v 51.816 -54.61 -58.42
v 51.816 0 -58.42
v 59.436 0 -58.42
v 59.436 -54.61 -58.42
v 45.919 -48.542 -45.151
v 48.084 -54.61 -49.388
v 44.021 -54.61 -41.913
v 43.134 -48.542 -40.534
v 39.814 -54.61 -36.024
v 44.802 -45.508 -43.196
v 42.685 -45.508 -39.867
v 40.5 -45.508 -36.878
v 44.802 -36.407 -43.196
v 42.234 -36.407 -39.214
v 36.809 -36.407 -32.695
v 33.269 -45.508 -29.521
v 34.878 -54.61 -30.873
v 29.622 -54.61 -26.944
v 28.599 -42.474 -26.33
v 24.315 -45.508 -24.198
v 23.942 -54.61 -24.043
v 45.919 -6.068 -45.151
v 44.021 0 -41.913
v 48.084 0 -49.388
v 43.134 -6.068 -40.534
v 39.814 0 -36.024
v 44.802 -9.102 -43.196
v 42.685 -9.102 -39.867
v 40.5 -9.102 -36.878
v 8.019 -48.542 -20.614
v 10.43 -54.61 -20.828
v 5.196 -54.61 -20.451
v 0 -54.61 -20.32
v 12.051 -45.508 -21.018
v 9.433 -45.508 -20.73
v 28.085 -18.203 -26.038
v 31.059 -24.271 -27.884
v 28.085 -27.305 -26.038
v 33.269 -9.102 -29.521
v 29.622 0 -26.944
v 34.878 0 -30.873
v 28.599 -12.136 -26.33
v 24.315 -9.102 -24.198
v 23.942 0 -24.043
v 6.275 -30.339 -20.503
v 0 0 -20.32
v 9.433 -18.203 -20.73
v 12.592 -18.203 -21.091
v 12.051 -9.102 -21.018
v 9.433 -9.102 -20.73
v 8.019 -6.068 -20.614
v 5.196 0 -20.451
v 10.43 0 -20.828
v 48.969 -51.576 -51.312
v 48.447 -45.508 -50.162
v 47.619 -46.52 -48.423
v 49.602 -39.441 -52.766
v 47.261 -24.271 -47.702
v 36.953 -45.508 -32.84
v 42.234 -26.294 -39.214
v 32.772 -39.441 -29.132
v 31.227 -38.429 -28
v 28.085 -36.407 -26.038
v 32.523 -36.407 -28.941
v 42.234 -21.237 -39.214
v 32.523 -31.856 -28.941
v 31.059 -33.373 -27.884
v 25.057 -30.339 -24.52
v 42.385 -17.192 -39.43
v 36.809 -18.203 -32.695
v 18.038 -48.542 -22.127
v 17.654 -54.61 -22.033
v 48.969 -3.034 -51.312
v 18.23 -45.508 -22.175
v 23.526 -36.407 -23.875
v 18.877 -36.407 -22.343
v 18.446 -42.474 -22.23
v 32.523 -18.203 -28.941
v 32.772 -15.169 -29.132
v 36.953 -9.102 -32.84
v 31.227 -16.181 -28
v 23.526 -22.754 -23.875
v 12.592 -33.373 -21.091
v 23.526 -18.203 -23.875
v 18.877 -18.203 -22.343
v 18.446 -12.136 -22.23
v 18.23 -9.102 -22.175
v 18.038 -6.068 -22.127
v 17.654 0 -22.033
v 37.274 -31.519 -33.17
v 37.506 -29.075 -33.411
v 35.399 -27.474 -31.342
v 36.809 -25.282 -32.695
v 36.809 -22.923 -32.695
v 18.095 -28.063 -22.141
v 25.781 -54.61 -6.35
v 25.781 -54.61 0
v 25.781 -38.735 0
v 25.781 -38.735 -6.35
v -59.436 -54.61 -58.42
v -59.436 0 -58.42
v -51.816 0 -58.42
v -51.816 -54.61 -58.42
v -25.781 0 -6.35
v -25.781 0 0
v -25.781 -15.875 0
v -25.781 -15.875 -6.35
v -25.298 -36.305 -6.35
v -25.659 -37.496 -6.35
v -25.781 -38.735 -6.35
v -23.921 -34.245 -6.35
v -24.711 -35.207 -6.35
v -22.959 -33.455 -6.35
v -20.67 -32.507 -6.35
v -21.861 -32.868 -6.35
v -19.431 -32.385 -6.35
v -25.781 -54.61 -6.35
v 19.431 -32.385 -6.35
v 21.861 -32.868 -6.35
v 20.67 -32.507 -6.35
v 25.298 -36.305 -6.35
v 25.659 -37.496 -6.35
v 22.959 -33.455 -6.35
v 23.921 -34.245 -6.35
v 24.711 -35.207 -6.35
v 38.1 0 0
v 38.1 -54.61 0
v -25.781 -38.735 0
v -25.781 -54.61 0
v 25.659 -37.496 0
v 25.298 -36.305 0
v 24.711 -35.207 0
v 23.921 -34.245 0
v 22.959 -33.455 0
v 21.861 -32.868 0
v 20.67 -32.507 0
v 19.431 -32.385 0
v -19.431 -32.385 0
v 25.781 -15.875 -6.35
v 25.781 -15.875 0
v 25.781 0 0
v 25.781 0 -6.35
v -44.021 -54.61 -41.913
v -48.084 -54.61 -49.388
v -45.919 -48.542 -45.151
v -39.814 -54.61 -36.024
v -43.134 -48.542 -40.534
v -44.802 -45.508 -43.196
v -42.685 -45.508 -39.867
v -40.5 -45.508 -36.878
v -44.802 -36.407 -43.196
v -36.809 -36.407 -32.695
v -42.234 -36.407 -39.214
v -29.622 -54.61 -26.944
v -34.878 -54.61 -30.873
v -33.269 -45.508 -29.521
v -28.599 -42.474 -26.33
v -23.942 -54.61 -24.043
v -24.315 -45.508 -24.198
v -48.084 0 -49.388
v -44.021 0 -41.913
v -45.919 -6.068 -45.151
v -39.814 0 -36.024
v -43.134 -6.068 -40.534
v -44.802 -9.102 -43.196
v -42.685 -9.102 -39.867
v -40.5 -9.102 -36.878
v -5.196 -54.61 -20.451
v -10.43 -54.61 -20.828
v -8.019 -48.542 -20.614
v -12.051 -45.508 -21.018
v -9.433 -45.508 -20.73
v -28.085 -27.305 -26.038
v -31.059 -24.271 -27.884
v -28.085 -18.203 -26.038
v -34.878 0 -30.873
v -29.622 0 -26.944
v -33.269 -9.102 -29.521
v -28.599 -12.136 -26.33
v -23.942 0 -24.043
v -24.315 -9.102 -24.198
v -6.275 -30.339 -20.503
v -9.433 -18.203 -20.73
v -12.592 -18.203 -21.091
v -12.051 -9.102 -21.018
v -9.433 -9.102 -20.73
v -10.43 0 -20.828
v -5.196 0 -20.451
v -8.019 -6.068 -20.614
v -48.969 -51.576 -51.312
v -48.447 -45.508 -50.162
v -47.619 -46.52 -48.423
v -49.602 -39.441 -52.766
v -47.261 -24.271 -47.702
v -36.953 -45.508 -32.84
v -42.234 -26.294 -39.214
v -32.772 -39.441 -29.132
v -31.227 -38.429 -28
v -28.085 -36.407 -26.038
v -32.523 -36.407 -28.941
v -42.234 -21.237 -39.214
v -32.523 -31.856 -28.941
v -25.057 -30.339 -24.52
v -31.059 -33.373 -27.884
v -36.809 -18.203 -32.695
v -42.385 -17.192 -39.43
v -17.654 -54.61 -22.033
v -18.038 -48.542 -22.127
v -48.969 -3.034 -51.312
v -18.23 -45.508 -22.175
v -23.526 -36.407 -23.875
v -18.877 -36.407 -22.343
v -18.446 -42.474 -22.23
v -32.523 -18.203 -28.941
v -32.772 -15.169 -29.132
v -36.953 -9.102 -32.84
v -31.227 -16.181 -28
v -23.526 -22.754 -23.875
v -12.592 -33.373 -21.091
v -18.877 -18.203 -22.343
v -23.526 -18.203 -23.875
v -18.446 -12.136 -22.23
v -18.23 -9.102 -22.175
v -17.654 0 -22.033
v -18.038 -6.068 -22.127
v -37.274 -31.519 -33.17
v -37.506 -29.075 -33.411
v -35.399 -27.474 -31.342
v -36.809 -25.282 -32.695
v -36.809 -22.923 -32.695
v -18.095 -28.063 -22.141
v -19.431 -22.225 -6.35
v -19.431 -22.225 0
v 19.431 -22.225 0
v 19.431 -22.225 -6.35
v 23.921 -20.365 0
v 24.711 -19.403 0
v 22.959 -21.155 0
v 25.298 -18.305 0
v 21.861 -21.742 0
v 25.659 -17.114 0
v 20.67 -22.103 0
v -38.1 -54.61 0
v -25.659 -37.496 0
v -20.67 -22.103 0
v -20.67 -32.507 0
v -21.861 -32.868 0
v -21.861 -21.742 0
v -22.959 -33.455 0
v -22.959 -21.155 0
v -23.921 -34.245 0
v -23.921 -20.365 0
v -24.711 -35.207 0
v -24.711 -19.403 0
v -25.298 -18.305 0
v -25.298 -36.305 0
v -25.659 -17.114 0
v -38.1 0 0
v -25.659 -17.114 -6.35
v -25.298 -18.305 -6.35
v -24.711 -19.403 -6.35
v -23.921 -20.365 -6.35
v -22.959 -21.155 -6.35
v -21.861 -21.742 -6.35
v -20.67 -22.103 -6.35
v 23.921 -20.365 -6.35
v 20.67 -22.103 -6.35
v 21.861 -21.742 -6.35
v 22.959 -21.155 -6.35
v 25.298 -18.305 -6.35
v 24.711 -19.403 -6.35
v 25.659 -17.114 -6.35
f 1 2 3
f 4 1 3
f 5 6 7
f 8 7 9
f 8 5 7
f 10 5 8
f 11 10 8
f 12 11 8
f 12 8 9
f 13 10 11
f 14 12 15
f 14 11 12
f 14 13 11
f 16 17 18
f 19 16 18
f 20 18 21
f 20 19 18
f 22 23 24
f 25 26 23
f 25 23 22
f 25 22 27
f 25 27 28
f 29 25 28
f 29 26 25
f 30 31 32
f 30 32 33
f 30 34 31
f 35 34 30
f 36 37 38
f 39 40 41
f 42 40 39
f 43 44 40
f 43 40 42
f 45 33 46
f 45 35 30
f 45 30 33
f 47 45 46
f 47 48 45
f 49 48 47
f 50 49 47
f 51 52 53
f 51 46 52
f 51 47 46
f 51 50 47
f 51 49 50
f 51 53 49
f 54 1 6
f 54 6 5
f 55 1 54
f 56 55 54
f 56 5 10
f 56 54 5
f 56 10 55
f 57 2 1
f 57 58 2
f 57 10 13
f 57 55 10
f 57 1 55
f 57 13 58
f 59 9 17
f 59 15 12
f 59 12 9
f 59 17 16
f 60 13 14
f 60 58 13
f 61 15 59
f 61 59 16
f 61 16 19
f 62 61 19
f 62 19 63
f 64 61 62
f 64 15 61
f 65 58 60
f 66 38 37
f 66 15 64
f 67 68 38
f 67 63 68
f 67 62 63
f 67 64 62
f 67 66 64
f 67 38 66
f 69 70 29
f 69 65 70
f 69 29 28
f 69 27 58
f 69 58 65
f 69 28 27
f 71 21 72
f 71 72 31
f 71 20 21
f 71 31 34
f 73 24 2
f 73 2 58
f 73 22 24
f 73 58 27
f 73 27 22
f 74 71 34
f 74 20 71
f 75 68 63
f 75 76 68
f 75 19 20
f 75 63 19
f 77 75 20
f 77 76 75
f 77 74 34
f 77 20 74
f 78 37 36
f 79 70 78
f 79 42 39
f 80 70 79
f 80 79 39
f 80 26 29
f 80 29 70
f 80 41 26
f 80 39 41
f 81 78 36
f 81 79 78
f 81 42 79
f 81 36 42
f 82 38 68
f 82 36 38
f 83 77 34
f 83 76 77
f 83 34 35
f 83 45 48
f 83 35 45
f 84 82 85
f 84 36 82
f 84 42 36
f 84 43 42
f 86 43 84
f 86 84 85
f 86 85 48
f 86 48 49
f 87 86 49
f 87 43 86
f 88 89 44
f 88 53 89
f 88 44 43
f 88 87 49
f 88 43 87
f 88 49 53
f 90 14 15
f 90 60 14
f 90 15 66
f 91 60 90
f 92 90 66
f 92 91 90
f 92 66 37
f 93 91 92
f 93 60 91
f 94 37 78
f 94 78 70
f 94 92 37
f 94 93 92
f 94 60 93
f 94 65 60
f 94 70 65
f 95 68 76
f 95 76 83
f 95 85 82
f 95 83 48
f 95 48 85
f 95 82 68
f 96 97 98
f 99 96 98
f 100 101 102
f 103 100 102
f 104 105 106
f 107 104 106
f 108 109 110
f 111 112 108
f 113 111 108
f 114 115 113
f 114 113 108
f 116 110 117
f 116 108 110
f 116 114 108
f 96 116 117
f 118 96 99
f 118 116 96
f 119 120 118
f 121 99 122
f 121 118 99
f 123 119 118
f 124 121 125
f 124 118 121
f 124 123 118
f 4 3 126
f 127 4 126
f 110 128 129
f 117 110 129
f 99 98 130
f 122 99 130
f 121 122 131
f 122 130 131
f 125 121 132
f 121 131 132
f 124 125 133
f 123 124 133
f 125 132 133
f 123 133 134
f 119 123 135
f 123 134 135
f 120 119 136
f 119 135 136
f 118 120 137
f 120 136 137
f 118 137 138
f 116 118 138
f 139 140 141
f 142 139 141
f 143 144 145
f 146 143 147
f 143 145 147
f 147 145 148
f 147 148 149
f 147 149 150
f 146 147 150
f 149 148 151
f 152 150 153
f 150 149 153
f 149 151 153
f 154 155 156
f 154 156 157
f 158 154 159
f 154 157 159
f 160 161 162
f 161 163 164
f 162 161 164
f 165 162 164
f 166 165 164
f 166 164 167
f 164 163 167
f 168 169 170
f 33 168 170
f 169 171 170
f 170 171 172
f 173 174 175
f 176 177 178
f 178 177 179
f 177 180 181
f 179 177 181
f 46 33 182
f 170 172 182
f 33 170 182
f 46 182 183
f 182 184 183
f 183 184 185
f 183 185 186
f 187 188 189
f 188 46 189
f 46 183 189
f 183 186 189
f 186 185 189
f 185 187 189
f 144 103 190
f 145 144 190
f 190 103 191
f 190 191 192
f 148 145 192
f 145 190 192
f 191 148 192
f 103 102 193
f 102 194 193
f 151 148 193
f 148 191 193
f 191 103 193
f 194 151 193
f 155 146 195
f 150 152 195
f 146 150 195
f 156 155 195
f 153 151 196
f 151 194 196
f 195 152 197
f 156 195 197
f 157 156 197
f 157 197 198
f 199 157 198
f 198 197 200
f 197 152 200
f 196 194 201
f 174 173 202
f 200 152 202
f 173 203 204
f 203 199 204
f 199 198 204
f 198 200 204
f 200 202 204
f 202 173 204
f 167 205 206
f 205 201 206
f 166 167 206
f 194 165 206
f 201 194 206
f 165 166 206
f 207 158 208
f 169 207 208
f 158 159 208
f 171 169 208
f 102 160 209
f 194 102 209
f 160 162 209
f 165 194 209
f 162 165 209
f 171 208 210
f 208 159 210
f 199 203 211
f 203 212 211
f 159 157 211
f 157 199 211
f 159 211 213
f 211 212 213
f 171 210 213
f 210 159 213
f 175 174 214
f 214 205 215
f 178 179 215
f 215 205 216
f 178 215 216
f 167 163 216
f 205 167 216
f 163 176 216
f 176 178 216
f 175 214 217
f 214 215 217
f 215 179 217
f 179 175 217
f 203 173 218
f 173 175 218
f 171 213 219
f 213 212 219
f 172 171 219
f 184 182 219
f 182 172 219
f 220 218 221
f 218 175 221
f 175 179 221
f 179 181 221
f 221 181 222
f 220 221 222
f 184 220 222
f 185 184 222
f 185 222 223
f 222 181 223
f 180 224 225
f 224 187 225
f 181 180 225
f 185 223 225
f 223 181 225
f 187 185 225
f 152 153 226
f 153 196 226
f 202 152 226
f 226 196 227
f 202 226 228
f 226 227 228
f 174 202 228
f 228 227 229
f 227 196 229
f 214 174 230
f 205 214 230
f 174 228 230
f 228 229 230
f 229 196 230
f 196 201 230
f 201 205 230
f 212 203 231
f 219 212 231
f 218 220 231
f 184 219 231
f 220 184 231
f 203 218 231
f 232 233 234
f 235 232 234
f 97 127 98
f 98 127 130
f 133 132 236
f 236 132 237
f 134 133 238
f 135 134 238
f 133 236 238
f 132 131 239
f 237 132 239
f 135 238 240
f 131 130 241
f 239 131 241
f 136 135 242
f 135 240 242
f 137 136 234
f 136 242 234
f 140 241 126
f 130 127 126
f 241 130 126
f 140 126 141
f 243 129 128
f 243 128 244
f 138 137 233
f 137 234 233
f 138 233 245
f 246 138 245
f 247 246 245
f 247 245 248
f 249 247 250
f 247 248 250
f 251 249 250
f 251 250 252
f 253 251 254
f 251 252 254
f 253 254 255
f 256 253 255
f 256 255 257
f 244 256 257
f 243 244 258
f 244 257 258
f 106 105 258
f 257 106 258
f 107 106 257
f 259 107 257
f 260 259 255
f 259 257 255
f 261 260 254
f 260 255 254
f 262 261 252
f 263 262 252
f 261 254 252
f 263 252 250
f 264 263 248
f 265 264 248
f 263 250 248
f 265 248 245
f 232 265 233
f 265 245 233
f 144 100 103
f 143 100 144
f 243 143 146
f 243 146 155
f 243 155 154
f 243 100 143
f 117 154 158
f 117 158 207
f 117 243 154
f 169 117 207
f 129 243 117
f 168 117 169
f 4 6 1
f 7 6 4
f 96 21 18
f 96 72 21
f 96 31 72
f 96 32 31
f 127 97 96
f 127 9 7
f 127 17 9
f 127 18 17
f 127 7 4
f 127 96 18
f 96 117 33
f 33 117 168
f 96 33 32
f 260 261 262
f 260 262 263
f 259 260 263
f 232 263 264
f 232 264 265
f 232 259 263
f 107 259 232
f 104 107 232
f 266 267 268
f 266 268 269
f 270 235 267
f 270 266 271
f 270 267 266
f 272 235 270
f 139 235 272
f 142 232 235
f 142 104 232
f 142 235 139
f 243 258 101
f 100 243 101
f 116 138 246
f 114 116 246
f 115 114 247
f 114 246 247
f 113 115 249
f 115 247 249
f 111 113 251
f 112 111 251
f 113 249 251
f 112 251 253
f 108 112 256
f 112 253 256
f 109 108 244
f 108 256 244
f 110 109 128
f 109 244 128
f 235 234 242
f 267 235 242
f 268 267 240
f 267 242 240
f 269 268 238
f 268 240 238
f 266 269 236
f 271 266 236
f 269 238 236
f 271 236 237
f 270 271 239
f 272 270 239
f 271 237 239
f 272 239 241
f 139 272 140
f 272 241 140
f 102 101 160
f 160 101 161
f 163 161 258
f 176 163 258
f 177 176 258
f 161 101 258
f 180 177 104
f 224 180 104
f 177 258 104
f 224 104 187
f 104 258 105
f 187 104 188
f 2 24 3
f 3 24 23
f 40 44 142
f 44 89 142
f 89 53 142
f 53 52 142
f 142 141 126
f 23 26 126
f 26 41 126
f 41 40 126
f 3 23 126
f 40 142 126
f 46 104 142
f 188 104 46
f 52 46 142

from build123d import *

# Parameters (mm, degrees)
F1_DEPTH = 54.61
F3_DEPTH = 6.35


with BuildPart() as f1:
    # F0 (on Front) → F1 (new body)
    with BuildSketch(Plane.XZ):
        with BuildLine():
            Line((38.1, 0), (0, 0))
            Line((0, 0), (-38.1, 0))
            Line((-38.1, 0), (-59.436, -58.42))
            Line((-59.436, -58.42), (-51.816, -58.42))
            add(Edge.make_bspline(
                [(-51.816, -58.42), (-38.931578, -22.661388), (-18.689103, -20.525511), (0, -20.32)],
                knots=[0, 0, 0, 0, 64.315689, 64.315689, 64.315689, 64.315689], degree=3))
            add(Edge.make_bspline(
                [(51.816, -58.42), (38.931578, -22.661388), (18.689103, -20.525511), (0, -20.32)],
                knots=[0, 0, 0, 0, 64.315689, 64.315689, 64.315689, 64.315689], degree=3))
            Line((51.816, -58.42), (59.436, -58.42))
            Line((59.436, -58.42), (38.1, 0))
        make_face()
    extrude(amount=F1_DEPTH)

    # F2 (on face) → F3 (cut)
    with BuildSketch(Plane.XY):
        with BuildLine():
            Line((-19.431, -22.225), (19.431, -22.225))
            ThreePointArc((19.431, -22.225), (23.921128, -20.365128), (25.781, -15.875))
            Line((25.781, -15.875), (25.781, 0))
            Line((25.781, 0), (-25.781, 0))
            Line((-25.781, 0), (-25.781, -15.875))
            ThreePointArc((-25.781, -15.875), (-23.921128, -20.365128), (-19.431, -22.225))
        make_face()
        with BuildLine():
            Line((-25.781, -54.61), (25.781, -54.61))
            Line((25.781, -54.61), (25.781, -38.735))
            ThreePointArc((25.781, -38.735), (23.921128, -34.244872), (19.431, -32.385))
            Line((19.431, -32.385), (-19.431, -32.385))
            ThreePointArc((-19.431, -32.385), (-23.921128, -34.244872), (-25.781, -38.735))
            Line((-25.781, -38.735), (-25.781, -54.61))
        make_face()
    extrude(amount=-F3_DEPTH, mode=Mode.SUBTRACT)


solid = f1.part
